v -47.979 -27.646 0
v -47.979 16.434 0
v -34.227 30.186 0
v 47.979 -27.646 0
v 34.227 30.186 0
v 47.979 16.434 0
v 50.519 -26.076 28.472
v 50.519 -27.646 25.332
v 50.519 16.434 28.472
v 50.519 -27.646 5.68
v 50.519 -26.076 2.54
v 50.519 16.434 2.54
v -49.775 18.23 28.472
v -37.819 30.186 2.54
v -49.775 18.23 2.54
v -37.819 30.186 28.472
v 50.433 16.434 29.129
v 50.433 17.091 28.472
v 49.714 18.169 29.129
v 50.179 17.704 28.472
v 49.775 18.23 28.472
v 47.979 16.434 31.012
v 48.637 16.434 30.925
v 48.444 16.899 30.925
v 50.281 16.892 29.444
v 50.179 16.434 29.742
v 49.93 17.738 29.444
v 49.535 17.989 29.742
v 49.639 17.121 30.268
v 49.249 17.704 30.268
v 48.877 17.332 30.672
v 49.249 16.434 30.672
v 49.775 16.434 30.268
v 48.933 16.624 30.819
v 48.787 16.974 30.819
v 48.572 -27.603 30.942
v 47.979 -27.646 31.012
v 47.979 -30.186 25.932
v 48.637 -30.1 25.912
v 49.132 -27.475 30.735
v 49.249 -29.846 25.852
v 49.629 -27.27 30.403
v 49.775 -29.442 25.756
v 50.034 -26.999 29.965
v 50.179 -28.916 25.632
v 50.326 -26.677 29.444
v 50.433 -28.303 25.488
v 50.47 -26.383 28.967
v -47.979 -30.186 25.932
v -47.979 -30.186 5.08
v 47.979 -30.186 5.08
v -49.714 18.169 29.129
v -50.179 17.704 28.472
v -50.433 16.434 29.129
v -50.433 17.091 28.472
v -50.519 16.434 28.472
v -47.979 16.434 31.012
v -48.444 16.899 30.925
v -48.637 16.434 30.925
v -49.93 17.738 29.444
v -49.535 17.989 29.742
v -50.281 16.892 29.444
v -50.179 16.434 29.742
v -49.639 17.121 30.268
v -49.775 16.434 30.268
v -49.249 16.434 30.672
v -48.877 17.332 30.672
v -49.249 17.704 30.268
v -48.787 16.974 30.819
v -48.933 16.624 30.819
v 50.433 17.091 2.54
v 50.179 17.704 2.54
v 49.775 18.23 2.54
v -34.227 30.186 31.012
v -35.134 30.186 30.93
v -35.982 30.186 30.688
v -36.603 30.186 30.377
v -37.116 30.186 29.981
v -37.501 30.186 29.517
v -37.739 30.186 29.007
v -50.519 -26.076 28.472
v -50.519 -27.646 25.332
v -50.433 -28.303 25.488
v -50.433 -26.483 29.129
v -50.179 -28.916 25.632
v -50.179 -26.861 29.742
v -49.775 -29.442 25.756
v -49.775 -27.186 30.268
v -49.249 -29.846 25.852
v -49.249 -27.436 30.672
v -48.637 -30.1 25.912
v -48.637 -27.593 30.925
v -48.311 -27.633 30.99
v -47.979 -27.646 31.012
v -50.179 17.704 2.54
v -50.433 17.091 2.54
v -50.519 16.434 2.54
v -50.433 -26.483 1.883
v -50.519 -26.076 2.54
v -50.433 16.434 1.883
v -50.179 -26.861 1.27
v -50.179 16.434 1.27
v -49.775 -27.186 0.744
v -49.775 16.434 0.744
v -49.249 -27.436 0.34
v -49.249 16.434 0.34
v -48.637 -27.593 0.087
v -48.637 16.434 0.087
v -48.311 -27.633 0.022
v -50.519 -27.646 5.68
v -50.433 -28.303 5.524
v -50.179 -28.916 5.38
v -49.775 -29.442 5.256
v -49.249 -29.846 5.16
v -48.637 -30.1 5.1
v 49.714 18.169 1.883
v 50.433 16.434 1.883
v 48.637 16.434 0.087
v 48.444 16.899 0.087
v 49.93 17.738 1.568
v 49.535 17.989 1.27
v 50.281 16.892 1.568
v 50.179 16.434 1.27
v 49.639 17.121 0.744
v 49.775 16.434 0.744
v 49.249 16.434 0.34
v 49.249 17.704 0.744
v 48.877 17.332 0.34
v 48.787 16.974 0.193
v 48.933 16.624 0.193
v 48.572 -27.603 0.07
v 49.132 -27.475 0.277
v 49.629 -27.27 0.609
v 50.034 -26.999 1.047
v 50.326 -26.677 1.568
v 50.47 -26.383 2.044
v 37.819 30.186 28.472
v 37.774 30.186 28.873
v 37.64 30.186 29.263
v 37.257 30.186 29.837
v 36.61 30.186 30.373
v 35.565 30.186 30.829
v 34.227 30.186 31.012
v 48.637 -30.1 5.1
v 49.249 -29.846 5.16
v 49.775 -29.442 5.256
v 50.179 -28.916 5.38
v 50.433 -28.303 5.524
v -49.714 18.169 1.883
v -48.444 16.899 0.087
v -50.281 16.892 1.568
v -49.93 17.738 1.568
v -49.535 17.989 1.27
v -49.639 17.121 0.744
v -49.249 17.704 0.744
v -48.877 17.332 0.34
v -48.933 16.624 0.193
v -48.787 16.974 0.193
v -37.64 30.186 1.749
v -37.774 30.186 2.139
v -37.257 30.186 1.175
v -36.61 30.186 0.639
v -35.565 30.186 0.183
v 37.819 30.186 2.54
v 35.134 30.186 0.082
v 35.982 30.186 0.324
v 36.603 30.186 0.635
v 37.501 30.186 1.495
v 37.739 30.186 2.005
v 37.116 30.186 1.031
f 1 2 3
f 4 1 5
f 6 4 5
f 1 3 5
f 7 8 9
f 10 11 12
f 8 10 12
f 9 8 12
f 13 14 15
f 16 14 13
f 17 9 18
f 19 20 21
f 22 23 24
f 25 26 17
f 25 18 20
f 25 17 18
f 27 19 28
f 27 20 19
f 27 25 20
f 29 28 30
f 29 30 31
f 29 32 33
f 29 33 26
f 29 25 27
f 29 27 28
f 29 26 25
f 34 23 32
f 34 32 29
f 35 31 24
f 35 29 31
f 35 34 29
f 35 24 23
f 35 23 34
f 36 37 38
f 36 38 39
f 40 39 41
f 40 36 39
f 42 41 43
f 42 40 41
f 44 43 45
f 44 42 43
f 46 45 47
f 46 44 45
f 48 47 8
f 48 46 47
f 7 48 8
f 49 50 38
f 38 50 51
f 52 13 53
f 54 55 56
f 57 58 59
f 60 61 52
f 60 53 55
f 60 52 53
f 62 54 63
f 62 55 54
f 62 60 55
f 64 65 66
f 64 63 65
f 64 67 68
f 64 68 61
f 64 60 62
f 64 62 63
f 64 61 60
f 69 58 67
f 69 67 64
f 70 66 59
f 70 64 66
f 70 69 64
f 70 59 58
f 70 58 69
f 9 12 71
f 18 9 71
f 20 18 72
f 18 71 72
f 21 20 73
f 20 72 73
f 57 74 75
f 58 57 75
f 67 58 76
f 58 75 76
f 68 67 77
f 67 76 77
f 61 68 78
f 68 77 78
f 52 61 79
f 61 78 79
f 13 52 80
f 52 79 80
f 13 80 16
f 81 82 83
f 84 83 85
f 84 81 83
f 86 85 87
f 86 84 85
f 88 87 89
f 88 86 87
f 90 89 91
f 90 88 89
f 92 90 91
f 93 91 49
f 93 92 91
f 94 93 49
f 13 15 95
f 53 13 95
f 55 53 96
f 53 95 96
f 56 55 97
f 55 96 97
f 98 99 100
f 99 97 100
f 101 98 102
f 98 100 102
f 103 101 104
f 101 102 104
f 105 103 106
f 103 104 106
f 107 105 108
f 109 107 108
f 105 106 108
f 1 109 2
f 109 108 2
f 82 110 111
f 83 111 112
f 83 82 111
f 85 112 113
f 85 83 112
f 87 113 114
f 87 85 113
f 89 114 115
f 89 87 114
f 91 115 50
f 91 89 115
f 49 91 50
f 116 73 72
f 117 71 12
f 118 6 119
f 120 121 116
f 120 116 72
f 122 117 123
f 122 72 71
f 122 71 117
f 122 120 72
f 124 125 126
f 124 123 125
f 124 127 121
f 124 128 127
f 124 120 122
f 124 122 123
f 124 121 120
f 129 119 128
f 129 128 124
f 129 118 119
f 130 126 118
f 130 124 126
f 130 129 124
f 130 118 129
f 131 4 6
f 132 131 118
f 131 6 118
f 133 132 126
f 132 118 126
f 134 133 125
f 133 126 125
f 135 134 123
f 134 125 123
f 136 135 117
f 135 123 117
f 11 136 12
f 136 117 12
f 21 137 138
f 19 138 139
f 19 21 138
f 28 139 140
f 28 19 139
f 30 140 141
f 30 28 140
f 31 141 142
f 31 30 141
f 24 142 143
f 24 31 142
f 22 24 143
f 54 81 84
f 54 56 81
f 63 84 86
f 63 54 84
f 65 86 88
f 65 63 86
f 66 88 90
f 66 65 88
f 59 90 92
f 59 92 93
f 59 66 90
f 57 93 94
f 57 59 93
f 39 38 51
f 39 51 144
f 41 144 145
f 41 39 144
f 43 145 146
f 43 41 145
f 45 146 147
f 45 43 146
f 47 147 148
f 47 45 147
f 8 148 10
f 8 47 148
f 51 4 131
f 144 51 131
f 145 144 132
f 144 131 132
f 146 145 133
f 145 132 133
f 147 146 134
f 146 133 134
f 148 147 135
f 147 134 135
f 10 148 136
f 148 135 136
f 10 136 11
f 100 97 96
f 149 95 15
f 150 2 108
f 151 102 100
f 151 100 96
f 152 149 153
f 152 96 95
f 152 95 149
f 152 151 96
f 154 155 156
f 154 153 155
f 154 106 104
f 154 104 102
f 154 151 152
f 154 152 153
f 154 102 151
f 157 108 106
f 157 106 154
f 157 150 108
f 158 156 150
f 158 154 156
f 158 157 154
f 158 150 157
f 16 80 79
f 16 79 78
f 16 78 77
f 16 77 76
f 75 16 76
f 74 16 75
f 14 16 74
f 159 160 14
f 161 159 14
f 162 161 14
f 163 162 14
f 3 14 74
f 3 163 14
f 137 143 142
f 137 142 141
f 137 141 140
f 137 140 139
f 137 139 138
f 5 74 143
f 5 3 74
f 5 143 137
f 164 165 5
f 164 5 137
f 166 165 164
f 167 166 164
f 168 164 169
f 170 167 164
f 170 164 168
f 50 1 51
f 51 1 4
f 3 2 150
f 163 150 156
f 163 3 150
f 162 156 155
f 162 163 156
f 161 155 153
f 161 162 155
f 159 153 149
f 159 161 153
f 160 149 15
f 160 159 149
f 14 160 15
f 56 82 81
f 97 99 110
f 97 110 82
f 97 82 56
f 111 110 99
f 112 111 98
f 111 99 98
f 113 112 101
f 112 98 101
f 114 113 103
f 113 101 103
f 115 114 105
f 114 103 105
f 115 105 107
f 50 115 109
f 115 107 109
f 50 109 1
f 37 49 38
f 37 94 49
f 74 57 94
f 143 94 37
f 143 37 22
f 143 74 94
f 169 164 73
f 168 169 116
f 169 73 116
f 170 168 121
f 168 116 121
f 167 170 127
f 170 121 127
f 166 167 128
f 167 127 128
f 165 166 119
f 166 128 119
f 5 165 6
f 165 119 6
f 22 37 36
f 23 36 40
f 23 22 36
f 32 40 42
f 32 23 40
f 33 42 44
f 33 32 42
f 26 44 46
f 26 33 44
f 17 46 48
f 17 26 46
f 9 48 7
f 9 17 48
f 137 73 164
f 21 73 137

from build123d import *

# Parameters (mm, degrees)
F0_W         = 101.0383963585
F0_H         = 60.3721439838
F1_DEPTH     = 31.0119315982
F3_SIZE2     = 2.54
F3_SIZE      = 5.08
F4_SIZE      = 12.7
F5_R         = 2.54
F6_T1_DEPTH  = 23.2584097937
F6_T3_DEPTH  = 23.2584097937
F6_T5_DEPTH  = 25.9319315982
F6_T10_DEPTH = 2.54
F6_T16_DEPTH = 2.54
F6_T22_DEPTH = 2.54
F6_T28_DEPTH = 2.54


# Not quite as in the source:
# - a fillet or chamfer that OpenCascade refuses, or shapes differently, is made with other operations: its cross-section is extruded or revolved along the edge and cut away or added


with BuildPart() as f1:
    # F0 (on Top) → F1 (new body)
    with BuildSketch(Plane.XY):
        Rectangle(F0_W, F0_H)
    extrude(amount=F1_DEPTH)

    # F3
    f3_edges = [f1.edges().sort_by_distance(p)[0] for p in [
        (0, -30.186072, 31.011932),
        (0, -30.186072, 0),
    ]]
    f3_side = f1.faces().sort_by_distance((0, -30.186072, 15.505966))[0]
    chamfer(f3_edges, length=F3_SIZE, length2=F3_SIZE2, reference=f3_side)

    # F4
    f4_edges = [f1.edges().sort_by_distance(p)[0] for p in [
        (50.519198, 30.186072, 15.505966),
        (-50.519198, 30.186072, 15.505966),
    ]]
    chamfer(f4_edges, length=F4_SIZE)

    # F5
    f5_edges = [f1.edges().sort_by_distance(p)[0] for p in [
        (50.519198, -30.186072, 15.505966),
        (50.519198, -28.916072, 28.471932),
        (50.519198, -5.08, 31.011932),
        (50.519198, -5.08, 0),
        (50.519198, -28.916072, 2.54),
        (-50.519198, -5.08, 31.011932),
        (-50.519198, -30.186072, 15.505966),
        (-50.519198, -28.916072, 28.471932),
        (-50.519198, -28.916072, 2.54),
        (-50.519198, -5.08, 0),
    ]]
    fillet(f5_edges, radius=F5_R)

    # F6: fillet of radius 2.54 on 6 edges, made by hand

    # F6_s2 → F6_t1 (cut)
    with BuildSketch(Plane(origin=(15.7726143179, -15.7726143179, 0), x_dir=(0, 0, 1), z_dir=(-0.7071067812, 0.7071067812, 0))):
        with BuildLine():
            ThreePointArc((28.4719315982, 48.0869876945), (30.2679828224, 47.3430389187), (31.0119315982, 45.5469876945))
            Line((31.0119315982, 45.5469876945), (31.0119315982, 48.0869876945))
            Line((31.0119315982, 48.0869876945), (28.4719315982, 48.0869876945))
        make_face()
        with BuildLine():
            ThreePointArc((2.54, 48.0869876945), (0.7439487758, 47.3430389187), (0, 45.5469876945))
            Line((0, 45.5469876945), (0, 48.0869876945))
            Line((0, 48.0869876945), (2.54, 48.0869876945))
        make_face()
    extrude(amount=F6_T1_DEPTH, mode=Mode.SUBTRACT)

    # F6_s4 → F6_t3 (cut)
    with BuildSketch(Plane(origin=(0.6735649669, 0.6735649669, 0), x_dir=(0, 0, 1), z_dir=(-0.7071067812, -0.7071067812, 0))):
        with BuildLine():
            ThreePointArc((31.0119315982, 45.5469876945), (30.2679828224, 47.3430389187), (28.4719315982, 48.0869876945))
            Line((28.4719315982, 48.0869876945), (31.0119315982, 48.0869876945))
            Line((31.0119315982, 48.0869876945), (31.0119315982, 45.5469876945))
        make_face()
        with BuildLine():
            ThreePointArc((0, 45.5469876945), (0.7439487758, 47.3430389187), (2.54, 48.0869876945))
            Line((2.54, 48.0869876945), (0, 48.0869876945))
            Line((0, 48.0869876945), (0, 45.5469876945))
        make_face()
    extrude(amount=F6_T3_DEPTH, mode=Mode.SUBTRACT)

    # F6_s6 → F6_t5 (cut)
    with BuildSketch(Plane.XY.offset(2.54)):
        with BuildLine():
            ThreePointArc((50.5191981792, 16.4339695435), (50.3258521918, 17.4059854617), (49.7752494035, 18.2300207677))
            Line((49.7752494035, 18.2300207677), (50.5191981792, 17.4860719919))
            Line((50.5191981792, 17.4860719919), (50.5191981792, 16.4339695435))
        make_face()
        with BuildLine():
            ThreePointArc((-49.7752494035, 18.2300207677), (-50.3258521918, 17.4059854617), (-50.5191981792, 16.4339695435))
            Line((-50.5191981792, 16.4339695435), (-50.5191981792, 17.4860719919))
            Line((-50.5191981792, 17.4860719919), (-49.7752494035, 18.2300207677))
        make_face()
    extrude(amount=F6_T5_DEPTH, mode=Mode.SUBTRACT)


with BuildPart() as f6_tool8:
    # F6_s9 → F6_t10 (new body)
    with BuildSketch(Plane.XY.offset(2.54)):
        Polygon((-47.9791981792, 16.4339695435), (-50.5191981792, 16.4339695435), (-50.5191981792, 17.4860719919), (-49.7752494035, 18.2300207677), align=None)
    extrude(amount=-F6_T10_DEPTH)

    # F6_s11 → F6_t12 (revolve, cut)
    with BuildSketch(Plane(origin=(-47.9791981792, 16.4339695435, 2.54), x_dir=(0.9238795325, -0.3826834324, 0), z_dir=(0.3826834324, 0.9238795325, 0))):
        with BuildLine():
            ThreePointArc((0, -2.54), (2.54, 0), (0, 2.54))
            Line((0, 2.54), (0, -2.54))
        make_face()
    revolve(axis=Axis((-47.9791981792, 16.4339695435, 2.54), (0, 0, -1)), mode=Mode.SUBTRACT)


with BuildPart() as f1_1:
    add(f1.part)

    # F6_t7: cut F6_tool8
    add(f6_tool8.part, mode=Mode.SUBTRACT)


with BuildPart() as f6_tool14:
    # F6_s15 → F6_t16 (new body)
    with BuildSketch(Plane.XY.offset(28.4719315982)):
        Polygon((-47.9791981792, 16.4339695435), (-50.5191981792, 16.4339695435), (-50.5191981792, 17.4860719919), (-49.7752494035, 18.2300207677), align=None)
    extrude(amount=F6_T16_DEPTH)

    # F6_s17 → F6_t18 (revolve, cut)
    with BuildSketch(Plane(origin=(-47.9791981792, 16.4339695435, 28.4719315982), x_dir=(0.9238795325, -0.3826834324, 0), z_dir=(-0.3826834324, -0.9238795325, 0))):
        with BuildLine():
            ThreePointArc((0, -2.54), (2.54, 0), (0, 2.54))
            Line((0, 2.54), (0, -2.54))
        make_face()
    revolve(axis=Axis((-47.9791981792, 16.4339695435, 28.4719315982), (0, 0, 1)), mode=Mode.SUBTRACT)


with BuildPart() as f1_2:
    add(f1_1.part)

    # F6_t13: cut F6_tool14
    add(f6_tool14.part, mode=Mode.SUBTRACT)


with BuildPart() as f6_tool20:
    # F6_s21 → F6_t22 (new body)
    with BuildSketch(Plane.XY.offset(2.54)):
        Polygon((47.9791981792, 16.4339695435), (50.5191981792, 16.4339695435), (50.5191981792, 17.4860719919), (49.7752494035, 18.2300207677), align=None)
    extrude(amount=-F6_T22_DEPTH)

    # F6_s23 → F6_t24 (revolve, cut)
    with BuildSketch(Plane(origin=(47.9791981792, 16.4339695435, 2.54), x_dir=(-0.9238795325, -0.3826834324, 0), z_dir=(0.3826834324, -0.9238795325, 0))):
        with BuildLine():
            ThreePointArc((0, -2.54), (2.54, 0), (0, 2.54))
            Line((0, 2.54), (0, -2.54))
        make_face()
    revolve(axis=Axis((47.9791981792, 16.4339695435, 2.54), (0, 0, -1)), mode=Mode.SUBTRACT)


with BuildPart() as f1_3:
    add(f1_2.part)

    # F6_t19: cut F6_tool20
    add(f6_tool20.part, mode=Mode.SUBTRACT)


with BuildPart() as f6_tool26:
    # F6_s27 → F6_t28 (new body)
    with BuildSketch(Plane.XY.offset(28.4719315982)):
        Polygon((47.9791981792, 16.4339695435), (50.5191981792, 16.4339695435), (50.5191981792, 17.4860719919), (49.7752494035, 18.2300207677), align=None)
    extrude(amount=F6_T28_DEPTH)

    # F6_s29 → F6_t30 (revolve, cut)
    with BuildSketch(Plane(origin=(47.9791981792, 16.4339695435, 28.4719315982), x_dir=(-0.9238795325, -0.3826834324, 0), z_dir=(-0.3826834324, 0.9238795325, 0))):
        with BuildLine():
            ThreePointArc((0, -2.54), (2.54, 0), (0, 2.54))
            Line((0, 2.54), (0, -2.54))
        make_face()
    revolve(axis=Axis((47.9791981792, 16.4339695435, 28.4719315982), (0, 0, 1)), mode=Mode.SUBTRACT)


with BuildPart() as f1_4:
    add(f1_3.part)

    # F6_t25: cut F6_tool26
    add(f6_tool26.part, mode=Mode.SUBTRACT)


solid = f1_4.part
